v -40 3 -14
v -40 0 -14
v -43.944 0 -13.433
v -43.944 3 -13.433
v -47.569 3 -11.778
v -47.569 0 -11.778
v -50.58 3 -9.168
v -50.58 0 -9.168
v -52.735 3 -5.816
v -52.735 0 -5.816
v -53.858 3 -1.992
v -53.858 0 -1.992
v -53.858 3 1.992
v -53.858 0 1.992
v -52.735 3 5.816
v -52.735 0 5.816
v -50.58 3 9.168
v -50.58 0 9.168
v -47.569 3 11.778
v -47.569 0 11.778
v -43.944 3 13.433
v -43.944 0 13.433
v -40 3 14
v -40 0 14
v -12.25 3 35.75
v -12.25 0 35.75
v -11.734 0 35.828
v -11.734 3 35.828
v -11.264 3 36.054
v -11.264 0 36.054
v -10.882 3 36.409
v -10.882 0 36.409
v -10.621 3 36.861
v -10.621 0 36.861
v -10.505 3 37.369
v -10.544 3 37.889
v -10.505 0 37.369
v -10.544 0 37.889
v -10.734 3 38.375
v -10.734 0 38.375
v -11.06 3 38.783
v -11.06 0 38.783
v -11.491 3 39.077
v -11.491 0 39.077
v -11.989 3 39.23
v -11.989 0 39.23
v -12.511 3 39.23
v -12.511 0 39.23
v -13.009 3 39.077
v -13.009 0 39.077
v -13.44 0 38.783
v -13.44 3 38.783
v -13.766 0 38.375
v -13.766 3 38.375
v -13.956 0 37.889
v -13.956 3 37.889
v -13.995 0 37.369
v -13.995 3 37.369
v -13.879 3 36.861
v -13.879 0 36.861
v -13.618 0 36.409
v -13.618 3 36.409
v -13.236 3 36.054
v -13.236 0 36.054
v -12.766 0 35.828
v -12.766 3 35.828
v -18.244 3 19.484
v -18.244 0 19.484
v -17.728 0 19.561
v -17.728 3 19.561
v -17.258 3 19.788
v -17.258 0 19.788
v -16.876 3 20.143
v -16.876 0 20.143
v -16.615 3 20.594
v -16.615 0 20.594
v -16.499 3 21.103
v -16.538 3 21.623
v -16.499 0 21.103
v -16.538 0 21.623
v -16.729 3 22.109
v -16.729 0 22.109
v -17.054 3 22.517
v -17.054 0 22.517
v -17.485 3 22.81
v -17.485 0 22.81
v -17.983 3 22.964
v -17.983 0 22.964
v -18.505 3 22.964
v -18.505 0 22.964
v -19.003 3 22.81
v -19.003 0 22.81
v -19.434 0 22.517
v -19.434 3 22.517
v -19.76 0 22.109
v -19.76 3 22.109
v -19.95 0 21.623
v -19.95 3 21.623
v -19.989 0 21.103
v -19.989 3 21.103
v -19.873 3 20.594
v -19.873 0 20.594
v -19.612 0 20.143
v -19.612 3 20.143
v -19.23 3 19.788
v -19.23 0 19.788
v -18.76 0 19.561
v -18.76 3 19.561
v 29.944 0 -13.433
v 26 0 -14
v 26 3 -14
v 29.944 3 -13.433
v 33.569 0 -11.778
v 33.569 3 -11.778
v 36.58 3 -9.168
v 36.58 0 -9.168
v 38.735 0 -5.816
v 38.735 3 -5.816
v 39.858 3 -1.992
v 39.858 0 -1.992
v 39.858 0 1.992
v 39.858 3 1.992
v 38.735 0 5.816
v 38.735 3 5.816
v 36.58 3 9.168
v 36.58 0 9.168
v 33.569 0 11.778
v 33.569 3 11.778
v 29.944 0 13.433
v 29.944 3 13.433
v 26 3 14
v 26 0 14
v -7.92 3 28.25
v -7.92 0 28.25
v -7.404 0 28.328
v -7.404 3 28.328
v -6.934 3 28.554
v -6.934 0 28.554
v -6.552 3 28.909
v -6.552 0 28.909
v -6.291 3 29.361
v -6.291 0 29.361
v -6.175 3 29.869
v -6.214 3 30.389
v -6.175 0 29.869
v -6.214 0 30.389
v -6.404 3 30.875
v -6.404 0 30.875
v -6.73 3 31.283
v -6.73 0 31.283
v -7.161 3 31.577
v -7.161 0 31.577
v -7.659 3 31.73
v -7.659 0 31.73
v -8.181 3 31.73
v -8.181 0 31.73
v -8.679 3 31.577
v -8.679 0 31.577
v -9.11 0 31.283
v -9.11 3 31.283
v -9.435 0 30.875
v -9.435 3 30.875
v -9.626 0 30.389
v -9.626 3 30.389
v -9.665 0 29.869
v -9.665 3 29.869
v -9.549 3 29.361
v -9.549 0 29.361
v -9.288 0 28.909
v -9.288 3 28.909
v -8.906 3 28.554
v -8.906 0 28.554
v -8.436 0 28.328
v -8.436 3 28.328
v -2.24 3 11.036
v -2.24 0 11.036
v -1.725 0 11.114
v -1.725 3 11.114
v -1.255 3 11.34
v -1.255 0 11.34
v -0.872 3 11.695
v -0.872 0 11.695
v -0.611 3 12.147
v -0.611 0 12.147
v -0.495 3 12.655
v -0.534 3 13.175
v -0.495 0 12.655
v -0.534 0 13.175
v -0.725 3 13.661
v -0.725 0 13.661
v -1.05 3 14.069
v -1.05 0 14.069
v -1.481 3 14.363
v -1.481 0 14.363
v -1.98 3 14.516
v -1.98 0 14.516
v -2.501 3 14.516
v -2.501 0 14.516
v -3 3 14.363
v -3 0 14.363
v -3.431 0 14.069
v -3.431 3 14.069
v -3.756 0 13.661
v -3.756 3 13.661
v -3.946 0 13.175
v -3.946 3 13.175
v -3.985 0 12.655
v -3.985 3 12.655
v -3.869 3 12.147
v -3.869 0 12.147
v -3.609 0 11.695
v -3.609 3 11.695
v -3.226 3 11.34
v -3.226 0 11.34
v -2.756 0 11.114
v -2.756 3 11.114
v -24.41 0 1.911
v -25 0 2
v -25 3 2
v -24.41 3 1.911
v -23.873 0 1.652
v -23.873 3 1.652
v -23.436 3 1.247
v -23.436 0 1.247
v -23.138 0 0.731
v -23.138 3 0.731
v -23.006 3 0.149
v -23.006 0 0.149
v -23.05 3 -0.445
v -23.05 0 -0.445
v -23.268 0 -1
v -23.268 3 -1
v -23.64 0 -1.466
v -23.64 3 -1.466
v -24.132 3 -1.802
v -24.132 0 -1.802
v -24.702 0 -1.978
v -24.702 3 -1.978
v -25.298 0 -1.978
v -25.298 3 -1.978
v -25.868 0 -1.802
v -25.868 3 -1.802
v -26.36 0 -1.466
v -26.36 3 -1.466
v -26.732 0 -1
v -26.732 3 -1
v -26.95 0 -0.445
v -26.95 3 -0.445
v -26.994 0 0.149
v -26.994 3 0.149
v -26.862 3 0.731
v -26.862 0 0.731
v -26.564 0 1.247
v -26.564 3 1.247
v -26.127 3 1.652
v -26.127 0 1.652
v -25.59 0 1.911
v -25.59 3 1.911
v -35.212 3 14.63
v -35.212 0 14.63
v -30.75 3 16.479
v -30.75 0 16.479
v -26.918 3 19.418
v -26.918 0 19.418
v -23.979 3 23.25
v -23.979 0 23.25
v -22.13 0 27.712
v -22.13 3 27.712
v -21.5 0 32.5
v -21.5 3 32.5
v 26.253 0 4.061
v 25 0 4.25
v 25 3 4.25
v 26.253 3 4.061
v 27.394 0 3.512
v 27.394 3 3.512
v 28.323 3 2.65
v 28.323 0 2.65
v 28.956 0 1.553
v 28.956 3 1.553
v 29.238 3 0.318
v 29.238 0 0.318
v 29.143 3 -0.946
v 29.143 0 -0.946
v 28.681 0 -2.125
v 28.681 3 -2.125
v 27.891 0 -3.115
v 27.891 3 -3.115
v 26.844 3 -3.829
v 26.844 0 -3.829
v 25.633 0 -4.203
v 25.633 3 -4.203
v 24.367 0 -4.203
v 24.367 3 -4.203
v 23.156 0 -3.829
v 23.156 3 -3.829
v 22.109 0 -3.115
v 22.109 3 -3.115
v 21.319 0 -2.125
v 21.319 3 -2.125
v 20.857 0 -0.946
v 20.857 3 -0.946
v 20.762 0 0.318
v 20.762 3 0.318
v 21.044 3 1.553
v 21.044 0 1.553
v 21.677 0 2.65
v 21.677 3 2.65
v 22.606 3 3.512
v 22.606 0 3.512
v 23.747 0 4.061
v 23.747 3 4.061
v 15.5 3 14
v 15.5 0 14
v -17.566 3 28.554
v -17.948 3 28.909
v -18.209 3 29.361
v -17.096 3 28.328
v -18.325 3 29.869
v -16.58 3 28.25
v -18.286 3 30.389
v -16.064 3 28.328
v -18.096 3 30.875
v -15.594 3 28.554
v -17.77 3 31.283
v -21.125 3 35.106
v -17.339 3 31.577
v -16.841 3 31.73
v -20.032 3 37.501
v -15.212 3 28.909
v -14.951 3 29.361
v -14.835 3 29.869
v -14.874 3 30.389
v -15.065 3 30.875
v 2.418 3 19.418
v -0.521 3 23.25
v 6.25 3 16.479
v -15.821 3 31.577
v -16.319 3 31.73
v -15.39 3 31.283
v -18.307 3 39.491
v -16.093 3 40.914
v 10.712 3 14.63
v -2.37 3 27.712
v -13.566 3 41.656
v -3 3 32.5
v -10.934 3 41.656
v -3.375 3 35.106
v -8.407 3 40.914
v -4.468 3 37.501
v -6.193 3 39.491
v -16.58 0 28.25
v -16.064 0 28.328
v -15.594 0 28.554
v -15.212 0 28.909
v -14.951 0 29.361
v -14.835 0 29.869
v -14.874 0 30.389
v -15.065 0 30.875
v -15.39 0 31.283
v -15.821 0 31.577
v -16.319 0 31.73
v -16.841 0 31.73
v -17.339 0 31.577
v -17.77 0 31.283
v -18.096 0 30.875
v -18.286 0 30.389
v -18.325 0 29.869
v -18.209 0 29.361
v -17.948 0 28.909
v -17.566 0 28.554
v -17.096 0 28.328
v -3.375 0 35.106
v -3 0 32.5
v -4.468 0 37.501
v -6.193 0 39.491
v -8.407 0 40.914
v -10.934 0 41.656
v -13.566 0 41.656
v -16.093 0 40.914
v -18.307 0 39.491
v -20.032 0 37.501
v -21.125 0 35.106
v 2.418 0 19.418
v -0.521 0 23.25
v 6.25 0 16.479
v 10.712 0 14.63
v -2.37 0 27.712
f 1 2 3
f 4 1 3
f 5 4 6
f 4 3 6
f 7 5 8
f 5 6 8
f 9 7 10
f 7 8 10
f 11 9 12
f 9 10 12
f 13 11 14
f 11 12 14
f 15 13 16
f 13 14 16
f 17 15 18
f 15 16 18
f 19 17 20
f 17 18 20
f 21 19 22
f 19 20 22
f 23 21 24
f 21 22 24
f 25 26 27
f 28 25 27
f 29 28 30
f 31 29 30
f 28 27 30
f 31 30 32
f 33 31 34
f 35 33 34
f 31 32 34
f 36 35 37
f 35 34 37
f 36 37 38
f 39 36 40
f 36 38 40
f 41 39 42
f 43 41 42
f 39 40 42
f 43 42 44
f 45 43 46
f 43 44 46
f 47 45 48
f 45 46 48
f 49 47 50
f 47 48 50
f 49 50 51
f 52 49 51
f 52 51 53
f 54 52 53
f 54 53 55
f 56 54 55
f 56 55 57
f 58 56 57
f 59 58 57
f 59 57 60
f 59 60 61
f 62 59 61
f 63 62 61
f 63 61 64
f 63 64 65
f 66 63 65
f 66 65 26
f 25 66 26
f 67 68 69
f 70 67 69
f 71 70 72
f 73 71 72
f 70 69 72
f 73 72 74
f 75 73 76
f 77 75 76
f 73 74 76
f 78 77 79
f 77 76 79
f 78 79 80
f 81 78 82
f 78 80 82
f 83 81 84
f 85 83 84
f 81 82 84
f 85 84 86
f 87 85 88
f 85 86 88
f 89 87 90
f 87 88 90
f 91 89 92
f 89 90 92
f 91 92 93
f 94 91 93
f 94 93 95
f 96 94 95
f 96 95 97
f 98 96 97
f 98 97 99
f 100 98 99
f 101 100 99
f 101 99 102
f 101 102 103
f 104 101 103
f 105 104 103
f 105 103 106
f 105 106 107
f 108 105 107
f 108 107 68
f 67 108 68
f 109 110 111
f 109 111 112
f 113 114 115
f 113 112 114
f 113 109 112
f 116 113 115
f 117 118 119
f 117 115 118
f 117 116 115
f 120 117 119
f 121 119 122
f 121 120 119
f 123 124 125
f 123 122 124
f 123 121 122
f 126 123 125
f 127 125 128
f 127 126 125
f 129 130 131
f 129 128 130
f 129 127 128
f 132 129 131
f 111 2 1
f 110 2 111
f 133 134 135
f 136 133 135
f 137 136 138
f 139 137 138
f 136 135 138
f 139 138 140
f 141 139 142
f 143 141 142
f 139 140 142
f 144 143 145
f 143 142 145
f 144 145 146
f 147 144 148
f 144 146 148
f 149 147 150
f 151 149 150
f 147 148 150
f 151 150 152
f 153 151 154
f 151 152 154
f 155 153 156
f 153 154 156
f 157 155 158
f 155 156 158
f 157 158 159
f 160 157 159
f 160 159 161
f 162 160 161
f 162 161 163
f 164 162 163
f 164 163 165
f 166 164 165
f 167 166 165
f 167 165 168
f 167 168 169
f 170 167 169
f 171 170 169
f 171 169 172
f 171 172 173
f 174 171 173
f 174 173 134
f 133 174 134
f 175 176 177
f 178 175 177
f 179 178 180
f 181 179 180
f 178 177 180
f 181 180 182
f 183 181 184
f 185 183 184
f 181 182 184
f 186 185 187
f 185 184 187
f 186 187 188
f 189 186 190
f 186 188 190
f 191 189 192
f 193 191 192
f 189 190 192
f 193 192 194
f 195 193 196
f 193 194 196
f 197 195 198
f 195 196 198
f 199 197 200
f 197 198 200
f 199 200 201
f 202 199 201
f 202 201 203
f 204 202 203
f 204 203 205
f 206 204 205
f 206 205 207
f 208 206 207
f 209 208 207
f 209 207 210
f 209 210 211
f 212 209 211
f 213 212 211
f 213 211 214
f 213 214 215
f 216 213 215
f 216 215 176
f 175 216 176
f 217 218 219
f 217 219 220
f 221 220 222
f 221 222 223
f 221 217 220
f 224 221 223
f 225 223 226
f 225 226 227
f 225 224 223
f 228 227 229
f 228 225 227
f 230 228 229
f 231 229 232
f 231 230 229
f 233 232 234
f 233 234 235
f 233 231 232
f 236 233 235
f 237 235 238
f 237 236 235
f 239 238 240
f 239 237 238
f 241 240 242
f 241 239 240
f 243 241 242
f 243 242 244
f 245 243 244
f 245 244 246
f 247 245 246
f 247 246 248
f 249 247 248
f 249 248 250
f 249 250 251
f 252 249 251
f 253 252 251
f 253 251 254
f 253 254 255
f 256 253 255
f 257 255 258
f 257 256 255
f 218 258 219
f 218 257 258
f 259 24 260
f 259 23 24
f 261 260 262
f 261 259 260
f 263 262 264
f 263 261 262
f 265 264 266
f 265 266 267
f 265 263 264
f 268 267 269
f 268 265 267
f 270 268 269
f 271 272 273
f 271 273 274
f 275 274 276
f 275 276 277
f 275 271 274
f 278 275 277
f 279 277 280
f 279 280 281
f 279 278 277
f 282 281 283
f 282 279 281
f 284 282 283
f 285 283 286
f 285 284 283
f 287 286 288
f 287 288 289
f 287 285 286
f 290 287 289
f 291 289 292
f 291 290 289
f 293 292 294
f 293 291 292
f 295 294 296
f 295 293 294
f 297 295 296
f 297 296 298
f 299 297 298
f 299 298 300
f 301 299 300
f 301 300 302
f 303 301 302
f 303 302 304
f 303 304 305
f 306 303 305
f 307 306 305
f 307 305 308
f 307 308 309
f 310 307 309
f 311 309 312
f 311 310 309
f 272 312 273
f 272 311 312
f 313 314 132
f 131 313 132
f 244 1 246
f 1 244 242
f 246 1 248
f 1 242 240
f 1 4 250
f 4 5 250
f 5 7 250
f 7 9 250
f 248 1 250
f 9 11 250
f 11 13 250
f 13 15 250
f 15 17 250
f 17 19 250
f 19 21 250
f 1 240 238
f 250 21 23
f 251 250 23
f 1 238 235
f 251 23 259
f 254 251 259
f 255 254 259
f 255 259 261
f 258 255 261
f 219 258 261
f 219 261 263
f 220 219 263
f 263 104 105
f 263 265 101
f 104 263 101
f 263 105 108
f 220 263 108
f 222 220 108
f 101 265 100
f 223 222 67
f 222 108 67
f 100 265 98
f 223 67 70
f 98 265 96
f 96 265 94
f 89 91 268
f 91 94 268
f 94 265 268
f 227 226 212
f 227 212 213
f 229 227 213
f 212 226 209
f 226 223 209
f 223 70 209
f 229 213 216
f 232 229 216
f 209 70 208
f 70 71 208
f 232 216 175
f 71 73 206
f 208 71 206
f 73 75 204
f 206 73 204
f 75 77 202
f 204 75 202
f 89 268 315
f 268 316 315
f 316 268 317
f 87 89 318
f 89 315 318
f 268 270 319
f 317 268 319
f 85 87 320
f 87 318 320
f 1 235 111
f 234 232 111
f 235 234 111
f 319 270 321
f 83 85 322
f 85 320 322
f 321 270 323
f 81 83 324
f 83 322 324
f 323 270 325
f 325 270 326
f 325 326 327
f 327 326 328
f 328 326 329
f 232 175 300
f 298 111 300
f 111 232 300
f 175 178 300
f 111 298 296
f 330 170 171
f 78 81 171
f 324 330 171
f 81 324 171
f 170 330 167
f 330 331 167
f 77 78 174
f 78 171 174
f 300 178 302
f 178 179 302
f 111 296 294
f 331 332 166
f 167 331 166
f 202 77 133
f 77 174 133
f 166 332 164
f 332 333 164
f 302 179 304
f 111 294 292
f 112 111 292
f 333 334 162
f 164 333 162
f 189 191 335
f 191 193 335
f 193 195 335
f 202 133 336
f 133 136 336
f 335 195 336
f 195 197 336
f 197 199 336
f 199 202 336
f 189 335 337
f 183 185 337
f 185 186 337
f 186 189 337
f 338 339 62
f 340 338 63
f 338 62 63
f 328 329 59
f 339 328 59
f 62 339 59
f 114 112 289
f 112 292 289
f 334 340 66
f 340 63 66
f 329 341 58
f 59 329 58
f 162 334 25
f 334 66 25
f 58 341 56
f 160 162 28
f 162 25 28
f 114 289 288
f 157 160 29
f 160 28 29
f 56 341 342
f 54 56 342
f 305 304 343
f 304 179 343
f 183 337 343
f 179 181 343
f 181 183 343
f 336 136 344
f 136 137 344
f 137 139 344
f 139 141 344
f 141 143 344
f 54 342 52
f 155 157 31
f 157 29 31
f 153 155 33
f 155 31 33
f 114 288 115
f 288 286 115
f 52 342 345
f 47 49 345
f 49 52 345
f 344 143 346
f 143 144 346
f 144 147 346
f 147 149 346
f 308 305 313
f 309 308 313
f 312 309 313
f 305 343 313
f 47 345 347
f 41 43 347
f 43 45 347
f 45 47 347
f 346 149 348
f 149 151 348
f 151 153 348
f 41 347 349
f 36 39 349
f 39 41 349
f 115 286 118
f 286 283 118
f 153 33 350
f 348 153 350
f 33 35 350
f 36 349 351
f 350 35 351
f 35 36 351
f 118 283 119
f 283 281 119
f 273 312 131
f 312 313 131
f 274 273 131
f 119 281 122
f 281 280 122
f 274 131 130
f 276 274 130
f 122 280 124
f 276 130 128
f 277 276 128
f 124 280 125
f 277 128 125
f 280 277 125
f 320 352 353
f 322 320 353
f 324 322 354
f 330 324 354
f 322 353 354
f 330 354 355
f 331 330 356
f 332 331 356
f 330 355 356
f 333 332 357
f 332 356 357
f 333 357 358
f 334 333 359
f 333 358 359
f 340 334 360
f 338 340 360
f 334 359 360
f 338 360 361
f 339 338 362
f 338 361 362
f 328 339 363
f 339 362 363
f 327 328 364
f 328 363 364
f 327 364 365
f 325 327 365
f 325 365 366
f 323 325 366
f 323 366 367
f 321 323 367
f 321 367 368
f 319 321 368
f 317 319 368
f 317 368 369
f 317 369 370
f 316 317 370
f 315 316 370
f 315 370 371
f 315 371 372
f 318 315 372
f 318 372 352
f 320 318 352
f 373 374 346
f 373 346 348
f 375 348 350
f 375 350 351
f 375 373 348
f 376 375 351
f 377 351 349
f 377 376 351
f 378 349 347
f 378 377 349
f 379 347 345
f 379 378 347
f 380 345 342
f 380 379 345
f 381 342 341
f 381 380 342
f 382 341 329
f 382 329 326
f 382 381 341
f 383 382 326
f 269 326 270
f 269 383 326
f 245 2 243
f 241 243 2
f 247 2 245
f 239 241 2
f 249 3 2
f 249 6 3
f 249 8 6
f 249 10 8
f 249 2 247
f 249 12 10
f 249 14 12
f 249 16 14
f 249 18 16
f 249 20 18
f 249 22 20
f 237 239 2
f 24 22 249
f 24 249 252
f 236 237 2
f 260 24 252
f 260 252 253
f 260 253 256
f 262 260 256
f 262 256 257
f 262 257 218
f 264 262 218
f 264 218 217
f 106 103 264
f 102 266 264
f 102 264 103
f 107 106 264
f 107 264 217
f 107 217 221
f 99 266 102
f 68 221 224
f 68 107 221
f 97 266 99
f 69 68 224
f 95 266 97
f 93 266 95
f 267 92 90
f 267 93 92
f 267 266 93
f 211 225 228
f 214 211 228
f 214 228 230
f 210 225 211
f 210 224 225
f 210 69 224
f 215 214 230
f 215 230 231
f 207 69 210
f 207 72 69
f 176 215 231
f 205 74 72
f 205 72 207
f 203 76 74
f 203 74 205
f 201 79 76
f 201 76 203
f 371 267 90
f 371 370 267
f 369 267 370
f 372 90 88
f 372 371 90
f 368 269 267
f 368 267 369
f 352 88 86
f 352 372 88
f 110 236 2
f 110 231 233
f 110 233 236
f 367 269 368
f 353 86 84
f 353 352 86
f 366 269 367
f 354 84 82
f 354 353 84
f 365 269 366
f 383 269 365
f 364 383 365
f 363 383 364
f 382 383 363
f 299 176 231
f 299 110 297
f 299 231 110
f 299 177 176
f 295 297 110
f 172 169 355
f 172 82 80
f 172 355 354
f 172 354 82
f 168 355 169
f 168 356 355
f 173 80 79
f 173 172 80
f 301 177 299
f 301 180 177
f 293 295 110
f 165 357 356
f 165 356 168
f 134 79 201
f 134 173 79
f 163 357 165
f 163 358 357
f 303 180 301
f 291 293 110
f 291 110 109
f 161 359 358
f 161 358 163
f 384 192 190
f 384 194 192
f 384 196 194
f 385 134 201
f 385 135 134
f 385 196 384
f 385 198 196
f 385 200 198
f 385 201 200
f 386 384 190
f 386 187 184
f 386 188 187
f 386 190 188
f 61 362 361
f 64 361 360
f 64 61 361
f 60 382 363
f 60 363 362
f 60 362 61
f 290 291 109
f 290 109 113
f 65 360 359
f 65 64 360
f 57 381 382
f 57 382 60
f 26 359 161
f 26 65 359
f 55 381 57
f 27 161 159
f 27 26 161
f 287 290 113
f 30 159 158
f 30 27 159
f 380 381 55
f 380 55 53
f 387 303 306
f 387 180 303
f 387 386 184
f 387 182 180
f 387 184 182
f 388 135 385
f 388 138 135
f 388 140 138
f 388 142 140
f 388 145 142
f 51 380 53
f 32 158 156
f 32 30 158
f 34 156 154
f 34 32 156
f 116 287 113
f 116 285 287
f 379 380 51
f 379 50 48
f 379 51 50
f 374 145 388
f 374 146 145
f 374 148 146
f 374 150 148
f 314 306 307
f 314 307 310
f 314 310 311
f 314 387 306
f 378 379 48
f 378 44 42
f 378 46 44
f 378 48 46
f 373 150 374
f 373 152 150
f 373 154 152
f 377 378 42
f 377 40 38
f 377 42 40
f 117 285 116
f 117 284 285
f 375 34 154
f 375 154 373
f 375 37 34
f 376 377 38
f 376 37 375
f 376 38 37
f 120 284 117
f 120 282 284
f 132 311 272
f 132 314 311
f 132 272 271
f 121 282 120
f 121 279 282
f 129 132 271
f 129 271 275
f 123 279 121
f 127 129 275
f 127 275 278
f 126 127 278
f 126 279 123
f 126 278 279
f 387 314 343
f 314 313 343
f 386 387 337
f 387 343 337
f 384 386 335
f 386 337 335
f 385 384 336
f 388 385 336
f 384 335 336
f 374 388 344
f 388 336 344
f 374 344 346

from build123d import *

# Parameters (mm, degrees)
SKETCH_1_W          = 80
SKETCH_1_H          = 28
SKETCH_1_R          = 4.25
SKETCH_1_R_2        = 2
EXTRUDE_1_DEPTH     = 3
FILLET_2_RADIUS     = 14
FILLET_2_LENGTH     = 3
EXTRUDE_3_DEPTH     = 3
SKETCH_5_W          = 18.5
SKETCH_5_H          = 18.5
EXTRUDE_4_DEPTH     = 3
FILLET_3_R          = 18.5
EXTRUDE_5_DEPTH     = 3
CUT_EXTRUDE_1_REACH = 70.323
SKETCH_10_R         = 1.75


with BuildPart() as part:
    # 草图1 → 凸台-拉伸1 (new body)
    with BuildSketch(Plane(origin=(0, 0, 0), x_dir=(1, 0, 0), z_dir=(0, 1, 0))):
        Rectangle(SKETCH_1_W, SKETCH_1_H)
        with Locations(Location((25, 0, 0), (0, 0, 270))):
            Circle(SKETCH_1_R, mode=Mode.SUBTRACT)
        with Locations(Location((-25, 0, 0), (0, 0, 270))):
            Circle(SKETCH_1_R_2, mode=Mode.SUBTRACT)
    extrude(amount=EXTRUDE_1_DEPTH)

    # 圆角2: full round fillet: the end face becomes a half cylinder, R = half its width
    fillet_2_face = Plane((40, 1.5, 0), x_dir=(0, -1, 0), z_dir=(1, 0, 0))  # on the end face: x along it, z out of the body
    fillet_2_slab = fillet_2_face.offset(-FILLET_2_RADIUS / 2) * Box(FILLET_2_LENGTH, 2 * FILLET_2_RADIUS, FILLET_2_RADIUS, mode=Mode.PRIVATE)  # the body's end, R deep
    fillet_2_round = Plane((26, 1.5, 0), x_dir=(1, 0, 0), z_dir=(0, -1, 0)) * Cylinder(FILLET_2_RADIUS, FILLET_2_LENGTH, mode=Mode.PRIVATE)  # its axis R under the face
    add(fillet_2_slab - fillet_2_round, mode=Mode.SUBTRACT)

    # 草图4 → 凸台-拉伸3 (add)
    with BuildSketch(Plane.XZ):
        with BuildLine():
            Line((-40, 14), (-40, -14))
            ThreePointArc((-40, -14), (-54, 0), (-40, 14))
        make_face()
    extrude(amount=-EXTRUDE_3_DEPTH)

    # 草图5 → 凸台-拉伸4 (add)
    with BuildSketch(Plane(origin=(0, 0, 0), x_dir=(-1, 0, 0), z_dir=(0, -1, 0))):
        with Locations((12.25, -23.25)):
            Rectangle(SKETCH_5_W, SKETCH_5_H)
    extrude(amount=-EXTRUDE_4_DEPTH)

    # 圆角3
    fillet_3_edges = [part.edges().sort_by_distance(p)[0] for p in [
        (-21.5, 1.5, 14),
        (-3, 1.5, 14),
    ]]
    fillet(fillet_3_edges, radius=FILLET_3_R - 0.0001)  # a hair under: the kernel refuses the full size

    # 草图6 → 凸台-拉伸5 (add)
    with BuildSketch(Plane.XZ):
        with BuildLine():
            Line((-21.5, 32.5), (-3, 32.5))
            ThreePointArc((-3, 32.5), (-12.25, 41.75), (-21.5, 32.5))
        make_face()
    extrude(amount=-EXTRUDE_5_DEPTH)

    # 草图10 → 切除-拉伸1 (cut, up to next)
    with BuildSketch(Plane.XZ, mode=Mode.PRIVATE) as cut_extrude_1_sk1:
        with Locations(Location((-12.25, 37.5, 0), (0, 0, 270))):
            Circle(SKETCH_10_R)
    cut_extrude_1_tool1 = extrude(cut_extrude_1_sk1.sketch, amount=-CUT_EXTRUDE_1_REACH, mode=Mode.PRIVATE) & part.part
    # 草图10 → 切除-拉伸1 (cut, up to next)
    with BuildSketch(Plane.XZ, mode=Mode.PRIVATE) as cut_extrude_1_sk2:
        with Locations(Location((-7.919872981, 30, 0), (0, 0, 270))):
            Circle(SKETCH_10_R)
    cut_extrude_1_tool2 = extrude(cut_extrude_1_sk2.sketch, amount=-CUT_EXTRUDE_1_REACH, mode=Mode.PRIVATE) & part.part
    # 草图10 → 切除-拉伸1 (cut, up to next)
    with BuildSketch(Plane.XZ, mode=Mode.PRIVATE) as cut_extrude_1_sk3:
        with Locations(Location((-16.580127019, 30, 0), (0, 0, 270))):
            Circle(SKETCH_10_R)
    cut_extrude_1_tool3 = extrude(cut_extrude_1_sk3.sketch, amount=-CUT_EXTRUDE_1_REACH, mode=Mode.PRIVATE) & part.part
    # 草图10 → 切除-拉伸1 (cut, up to next)
    with BuildSketch(Plane.XZ, mode=Mode.PRIVATE) as cut_extrude_1_sk4:
        with Locations(Location((-18.244078093, 21.233684631, 0), (0, 0, 270))):
            Circle(SKETCH_10_R)
    cut_extrude_1_tool4 = extrude(cut_extrude_1_sk4.sketch, amount=-CUT_EXTRUDE_1_REACH, mode=Mode.PRIVATE) & part.part
    # 草图10 → 切除-拉伸1 (cut, up to next)
    with BuildSketch(Plane.XZ, mode=Mode.PRIVATE) as cut_extrude_1_sk5:
        with Locations(Location((-2.240350538, 12.7860315, 0), (0, 0, 270))):
            Circle(SKETCH_10_R)
    cut_extrude_1_tool5 = extrude(cut_extrude_1_sk5.sketch, amount=-CUT_EXTRUDE_1_REACH, mode=Mode.PRIVATE) & part.part
    add(cut_extrude_1_tool1.solids().sort_by_distance((-12.25, 0, 37.5))[0], mode=Mode.SUBTRACT)
    add(cut_extrude_1_tool2.solids().sort_by_distance((-7.919873, 0, 30))[0], mode=Mode.SUBTRACT)
    add(cut_extrude_1_tool3.solids().sort_by_distance((-16.580127, 0, 30))[0], mode=Mode.SUBTRACT)
    add(cut_extrude_1_tool4.solids().sort_by_distance((-18.244078, 0, 21.233685))[0], mode=Mode.SUBTRACT)
    add(cut_extrude_1_tool5.solids().sort_by_distance((-2.240351, 0, 12.786031))[0], mode=Mode.SUBTRACT)


solid = part.part
